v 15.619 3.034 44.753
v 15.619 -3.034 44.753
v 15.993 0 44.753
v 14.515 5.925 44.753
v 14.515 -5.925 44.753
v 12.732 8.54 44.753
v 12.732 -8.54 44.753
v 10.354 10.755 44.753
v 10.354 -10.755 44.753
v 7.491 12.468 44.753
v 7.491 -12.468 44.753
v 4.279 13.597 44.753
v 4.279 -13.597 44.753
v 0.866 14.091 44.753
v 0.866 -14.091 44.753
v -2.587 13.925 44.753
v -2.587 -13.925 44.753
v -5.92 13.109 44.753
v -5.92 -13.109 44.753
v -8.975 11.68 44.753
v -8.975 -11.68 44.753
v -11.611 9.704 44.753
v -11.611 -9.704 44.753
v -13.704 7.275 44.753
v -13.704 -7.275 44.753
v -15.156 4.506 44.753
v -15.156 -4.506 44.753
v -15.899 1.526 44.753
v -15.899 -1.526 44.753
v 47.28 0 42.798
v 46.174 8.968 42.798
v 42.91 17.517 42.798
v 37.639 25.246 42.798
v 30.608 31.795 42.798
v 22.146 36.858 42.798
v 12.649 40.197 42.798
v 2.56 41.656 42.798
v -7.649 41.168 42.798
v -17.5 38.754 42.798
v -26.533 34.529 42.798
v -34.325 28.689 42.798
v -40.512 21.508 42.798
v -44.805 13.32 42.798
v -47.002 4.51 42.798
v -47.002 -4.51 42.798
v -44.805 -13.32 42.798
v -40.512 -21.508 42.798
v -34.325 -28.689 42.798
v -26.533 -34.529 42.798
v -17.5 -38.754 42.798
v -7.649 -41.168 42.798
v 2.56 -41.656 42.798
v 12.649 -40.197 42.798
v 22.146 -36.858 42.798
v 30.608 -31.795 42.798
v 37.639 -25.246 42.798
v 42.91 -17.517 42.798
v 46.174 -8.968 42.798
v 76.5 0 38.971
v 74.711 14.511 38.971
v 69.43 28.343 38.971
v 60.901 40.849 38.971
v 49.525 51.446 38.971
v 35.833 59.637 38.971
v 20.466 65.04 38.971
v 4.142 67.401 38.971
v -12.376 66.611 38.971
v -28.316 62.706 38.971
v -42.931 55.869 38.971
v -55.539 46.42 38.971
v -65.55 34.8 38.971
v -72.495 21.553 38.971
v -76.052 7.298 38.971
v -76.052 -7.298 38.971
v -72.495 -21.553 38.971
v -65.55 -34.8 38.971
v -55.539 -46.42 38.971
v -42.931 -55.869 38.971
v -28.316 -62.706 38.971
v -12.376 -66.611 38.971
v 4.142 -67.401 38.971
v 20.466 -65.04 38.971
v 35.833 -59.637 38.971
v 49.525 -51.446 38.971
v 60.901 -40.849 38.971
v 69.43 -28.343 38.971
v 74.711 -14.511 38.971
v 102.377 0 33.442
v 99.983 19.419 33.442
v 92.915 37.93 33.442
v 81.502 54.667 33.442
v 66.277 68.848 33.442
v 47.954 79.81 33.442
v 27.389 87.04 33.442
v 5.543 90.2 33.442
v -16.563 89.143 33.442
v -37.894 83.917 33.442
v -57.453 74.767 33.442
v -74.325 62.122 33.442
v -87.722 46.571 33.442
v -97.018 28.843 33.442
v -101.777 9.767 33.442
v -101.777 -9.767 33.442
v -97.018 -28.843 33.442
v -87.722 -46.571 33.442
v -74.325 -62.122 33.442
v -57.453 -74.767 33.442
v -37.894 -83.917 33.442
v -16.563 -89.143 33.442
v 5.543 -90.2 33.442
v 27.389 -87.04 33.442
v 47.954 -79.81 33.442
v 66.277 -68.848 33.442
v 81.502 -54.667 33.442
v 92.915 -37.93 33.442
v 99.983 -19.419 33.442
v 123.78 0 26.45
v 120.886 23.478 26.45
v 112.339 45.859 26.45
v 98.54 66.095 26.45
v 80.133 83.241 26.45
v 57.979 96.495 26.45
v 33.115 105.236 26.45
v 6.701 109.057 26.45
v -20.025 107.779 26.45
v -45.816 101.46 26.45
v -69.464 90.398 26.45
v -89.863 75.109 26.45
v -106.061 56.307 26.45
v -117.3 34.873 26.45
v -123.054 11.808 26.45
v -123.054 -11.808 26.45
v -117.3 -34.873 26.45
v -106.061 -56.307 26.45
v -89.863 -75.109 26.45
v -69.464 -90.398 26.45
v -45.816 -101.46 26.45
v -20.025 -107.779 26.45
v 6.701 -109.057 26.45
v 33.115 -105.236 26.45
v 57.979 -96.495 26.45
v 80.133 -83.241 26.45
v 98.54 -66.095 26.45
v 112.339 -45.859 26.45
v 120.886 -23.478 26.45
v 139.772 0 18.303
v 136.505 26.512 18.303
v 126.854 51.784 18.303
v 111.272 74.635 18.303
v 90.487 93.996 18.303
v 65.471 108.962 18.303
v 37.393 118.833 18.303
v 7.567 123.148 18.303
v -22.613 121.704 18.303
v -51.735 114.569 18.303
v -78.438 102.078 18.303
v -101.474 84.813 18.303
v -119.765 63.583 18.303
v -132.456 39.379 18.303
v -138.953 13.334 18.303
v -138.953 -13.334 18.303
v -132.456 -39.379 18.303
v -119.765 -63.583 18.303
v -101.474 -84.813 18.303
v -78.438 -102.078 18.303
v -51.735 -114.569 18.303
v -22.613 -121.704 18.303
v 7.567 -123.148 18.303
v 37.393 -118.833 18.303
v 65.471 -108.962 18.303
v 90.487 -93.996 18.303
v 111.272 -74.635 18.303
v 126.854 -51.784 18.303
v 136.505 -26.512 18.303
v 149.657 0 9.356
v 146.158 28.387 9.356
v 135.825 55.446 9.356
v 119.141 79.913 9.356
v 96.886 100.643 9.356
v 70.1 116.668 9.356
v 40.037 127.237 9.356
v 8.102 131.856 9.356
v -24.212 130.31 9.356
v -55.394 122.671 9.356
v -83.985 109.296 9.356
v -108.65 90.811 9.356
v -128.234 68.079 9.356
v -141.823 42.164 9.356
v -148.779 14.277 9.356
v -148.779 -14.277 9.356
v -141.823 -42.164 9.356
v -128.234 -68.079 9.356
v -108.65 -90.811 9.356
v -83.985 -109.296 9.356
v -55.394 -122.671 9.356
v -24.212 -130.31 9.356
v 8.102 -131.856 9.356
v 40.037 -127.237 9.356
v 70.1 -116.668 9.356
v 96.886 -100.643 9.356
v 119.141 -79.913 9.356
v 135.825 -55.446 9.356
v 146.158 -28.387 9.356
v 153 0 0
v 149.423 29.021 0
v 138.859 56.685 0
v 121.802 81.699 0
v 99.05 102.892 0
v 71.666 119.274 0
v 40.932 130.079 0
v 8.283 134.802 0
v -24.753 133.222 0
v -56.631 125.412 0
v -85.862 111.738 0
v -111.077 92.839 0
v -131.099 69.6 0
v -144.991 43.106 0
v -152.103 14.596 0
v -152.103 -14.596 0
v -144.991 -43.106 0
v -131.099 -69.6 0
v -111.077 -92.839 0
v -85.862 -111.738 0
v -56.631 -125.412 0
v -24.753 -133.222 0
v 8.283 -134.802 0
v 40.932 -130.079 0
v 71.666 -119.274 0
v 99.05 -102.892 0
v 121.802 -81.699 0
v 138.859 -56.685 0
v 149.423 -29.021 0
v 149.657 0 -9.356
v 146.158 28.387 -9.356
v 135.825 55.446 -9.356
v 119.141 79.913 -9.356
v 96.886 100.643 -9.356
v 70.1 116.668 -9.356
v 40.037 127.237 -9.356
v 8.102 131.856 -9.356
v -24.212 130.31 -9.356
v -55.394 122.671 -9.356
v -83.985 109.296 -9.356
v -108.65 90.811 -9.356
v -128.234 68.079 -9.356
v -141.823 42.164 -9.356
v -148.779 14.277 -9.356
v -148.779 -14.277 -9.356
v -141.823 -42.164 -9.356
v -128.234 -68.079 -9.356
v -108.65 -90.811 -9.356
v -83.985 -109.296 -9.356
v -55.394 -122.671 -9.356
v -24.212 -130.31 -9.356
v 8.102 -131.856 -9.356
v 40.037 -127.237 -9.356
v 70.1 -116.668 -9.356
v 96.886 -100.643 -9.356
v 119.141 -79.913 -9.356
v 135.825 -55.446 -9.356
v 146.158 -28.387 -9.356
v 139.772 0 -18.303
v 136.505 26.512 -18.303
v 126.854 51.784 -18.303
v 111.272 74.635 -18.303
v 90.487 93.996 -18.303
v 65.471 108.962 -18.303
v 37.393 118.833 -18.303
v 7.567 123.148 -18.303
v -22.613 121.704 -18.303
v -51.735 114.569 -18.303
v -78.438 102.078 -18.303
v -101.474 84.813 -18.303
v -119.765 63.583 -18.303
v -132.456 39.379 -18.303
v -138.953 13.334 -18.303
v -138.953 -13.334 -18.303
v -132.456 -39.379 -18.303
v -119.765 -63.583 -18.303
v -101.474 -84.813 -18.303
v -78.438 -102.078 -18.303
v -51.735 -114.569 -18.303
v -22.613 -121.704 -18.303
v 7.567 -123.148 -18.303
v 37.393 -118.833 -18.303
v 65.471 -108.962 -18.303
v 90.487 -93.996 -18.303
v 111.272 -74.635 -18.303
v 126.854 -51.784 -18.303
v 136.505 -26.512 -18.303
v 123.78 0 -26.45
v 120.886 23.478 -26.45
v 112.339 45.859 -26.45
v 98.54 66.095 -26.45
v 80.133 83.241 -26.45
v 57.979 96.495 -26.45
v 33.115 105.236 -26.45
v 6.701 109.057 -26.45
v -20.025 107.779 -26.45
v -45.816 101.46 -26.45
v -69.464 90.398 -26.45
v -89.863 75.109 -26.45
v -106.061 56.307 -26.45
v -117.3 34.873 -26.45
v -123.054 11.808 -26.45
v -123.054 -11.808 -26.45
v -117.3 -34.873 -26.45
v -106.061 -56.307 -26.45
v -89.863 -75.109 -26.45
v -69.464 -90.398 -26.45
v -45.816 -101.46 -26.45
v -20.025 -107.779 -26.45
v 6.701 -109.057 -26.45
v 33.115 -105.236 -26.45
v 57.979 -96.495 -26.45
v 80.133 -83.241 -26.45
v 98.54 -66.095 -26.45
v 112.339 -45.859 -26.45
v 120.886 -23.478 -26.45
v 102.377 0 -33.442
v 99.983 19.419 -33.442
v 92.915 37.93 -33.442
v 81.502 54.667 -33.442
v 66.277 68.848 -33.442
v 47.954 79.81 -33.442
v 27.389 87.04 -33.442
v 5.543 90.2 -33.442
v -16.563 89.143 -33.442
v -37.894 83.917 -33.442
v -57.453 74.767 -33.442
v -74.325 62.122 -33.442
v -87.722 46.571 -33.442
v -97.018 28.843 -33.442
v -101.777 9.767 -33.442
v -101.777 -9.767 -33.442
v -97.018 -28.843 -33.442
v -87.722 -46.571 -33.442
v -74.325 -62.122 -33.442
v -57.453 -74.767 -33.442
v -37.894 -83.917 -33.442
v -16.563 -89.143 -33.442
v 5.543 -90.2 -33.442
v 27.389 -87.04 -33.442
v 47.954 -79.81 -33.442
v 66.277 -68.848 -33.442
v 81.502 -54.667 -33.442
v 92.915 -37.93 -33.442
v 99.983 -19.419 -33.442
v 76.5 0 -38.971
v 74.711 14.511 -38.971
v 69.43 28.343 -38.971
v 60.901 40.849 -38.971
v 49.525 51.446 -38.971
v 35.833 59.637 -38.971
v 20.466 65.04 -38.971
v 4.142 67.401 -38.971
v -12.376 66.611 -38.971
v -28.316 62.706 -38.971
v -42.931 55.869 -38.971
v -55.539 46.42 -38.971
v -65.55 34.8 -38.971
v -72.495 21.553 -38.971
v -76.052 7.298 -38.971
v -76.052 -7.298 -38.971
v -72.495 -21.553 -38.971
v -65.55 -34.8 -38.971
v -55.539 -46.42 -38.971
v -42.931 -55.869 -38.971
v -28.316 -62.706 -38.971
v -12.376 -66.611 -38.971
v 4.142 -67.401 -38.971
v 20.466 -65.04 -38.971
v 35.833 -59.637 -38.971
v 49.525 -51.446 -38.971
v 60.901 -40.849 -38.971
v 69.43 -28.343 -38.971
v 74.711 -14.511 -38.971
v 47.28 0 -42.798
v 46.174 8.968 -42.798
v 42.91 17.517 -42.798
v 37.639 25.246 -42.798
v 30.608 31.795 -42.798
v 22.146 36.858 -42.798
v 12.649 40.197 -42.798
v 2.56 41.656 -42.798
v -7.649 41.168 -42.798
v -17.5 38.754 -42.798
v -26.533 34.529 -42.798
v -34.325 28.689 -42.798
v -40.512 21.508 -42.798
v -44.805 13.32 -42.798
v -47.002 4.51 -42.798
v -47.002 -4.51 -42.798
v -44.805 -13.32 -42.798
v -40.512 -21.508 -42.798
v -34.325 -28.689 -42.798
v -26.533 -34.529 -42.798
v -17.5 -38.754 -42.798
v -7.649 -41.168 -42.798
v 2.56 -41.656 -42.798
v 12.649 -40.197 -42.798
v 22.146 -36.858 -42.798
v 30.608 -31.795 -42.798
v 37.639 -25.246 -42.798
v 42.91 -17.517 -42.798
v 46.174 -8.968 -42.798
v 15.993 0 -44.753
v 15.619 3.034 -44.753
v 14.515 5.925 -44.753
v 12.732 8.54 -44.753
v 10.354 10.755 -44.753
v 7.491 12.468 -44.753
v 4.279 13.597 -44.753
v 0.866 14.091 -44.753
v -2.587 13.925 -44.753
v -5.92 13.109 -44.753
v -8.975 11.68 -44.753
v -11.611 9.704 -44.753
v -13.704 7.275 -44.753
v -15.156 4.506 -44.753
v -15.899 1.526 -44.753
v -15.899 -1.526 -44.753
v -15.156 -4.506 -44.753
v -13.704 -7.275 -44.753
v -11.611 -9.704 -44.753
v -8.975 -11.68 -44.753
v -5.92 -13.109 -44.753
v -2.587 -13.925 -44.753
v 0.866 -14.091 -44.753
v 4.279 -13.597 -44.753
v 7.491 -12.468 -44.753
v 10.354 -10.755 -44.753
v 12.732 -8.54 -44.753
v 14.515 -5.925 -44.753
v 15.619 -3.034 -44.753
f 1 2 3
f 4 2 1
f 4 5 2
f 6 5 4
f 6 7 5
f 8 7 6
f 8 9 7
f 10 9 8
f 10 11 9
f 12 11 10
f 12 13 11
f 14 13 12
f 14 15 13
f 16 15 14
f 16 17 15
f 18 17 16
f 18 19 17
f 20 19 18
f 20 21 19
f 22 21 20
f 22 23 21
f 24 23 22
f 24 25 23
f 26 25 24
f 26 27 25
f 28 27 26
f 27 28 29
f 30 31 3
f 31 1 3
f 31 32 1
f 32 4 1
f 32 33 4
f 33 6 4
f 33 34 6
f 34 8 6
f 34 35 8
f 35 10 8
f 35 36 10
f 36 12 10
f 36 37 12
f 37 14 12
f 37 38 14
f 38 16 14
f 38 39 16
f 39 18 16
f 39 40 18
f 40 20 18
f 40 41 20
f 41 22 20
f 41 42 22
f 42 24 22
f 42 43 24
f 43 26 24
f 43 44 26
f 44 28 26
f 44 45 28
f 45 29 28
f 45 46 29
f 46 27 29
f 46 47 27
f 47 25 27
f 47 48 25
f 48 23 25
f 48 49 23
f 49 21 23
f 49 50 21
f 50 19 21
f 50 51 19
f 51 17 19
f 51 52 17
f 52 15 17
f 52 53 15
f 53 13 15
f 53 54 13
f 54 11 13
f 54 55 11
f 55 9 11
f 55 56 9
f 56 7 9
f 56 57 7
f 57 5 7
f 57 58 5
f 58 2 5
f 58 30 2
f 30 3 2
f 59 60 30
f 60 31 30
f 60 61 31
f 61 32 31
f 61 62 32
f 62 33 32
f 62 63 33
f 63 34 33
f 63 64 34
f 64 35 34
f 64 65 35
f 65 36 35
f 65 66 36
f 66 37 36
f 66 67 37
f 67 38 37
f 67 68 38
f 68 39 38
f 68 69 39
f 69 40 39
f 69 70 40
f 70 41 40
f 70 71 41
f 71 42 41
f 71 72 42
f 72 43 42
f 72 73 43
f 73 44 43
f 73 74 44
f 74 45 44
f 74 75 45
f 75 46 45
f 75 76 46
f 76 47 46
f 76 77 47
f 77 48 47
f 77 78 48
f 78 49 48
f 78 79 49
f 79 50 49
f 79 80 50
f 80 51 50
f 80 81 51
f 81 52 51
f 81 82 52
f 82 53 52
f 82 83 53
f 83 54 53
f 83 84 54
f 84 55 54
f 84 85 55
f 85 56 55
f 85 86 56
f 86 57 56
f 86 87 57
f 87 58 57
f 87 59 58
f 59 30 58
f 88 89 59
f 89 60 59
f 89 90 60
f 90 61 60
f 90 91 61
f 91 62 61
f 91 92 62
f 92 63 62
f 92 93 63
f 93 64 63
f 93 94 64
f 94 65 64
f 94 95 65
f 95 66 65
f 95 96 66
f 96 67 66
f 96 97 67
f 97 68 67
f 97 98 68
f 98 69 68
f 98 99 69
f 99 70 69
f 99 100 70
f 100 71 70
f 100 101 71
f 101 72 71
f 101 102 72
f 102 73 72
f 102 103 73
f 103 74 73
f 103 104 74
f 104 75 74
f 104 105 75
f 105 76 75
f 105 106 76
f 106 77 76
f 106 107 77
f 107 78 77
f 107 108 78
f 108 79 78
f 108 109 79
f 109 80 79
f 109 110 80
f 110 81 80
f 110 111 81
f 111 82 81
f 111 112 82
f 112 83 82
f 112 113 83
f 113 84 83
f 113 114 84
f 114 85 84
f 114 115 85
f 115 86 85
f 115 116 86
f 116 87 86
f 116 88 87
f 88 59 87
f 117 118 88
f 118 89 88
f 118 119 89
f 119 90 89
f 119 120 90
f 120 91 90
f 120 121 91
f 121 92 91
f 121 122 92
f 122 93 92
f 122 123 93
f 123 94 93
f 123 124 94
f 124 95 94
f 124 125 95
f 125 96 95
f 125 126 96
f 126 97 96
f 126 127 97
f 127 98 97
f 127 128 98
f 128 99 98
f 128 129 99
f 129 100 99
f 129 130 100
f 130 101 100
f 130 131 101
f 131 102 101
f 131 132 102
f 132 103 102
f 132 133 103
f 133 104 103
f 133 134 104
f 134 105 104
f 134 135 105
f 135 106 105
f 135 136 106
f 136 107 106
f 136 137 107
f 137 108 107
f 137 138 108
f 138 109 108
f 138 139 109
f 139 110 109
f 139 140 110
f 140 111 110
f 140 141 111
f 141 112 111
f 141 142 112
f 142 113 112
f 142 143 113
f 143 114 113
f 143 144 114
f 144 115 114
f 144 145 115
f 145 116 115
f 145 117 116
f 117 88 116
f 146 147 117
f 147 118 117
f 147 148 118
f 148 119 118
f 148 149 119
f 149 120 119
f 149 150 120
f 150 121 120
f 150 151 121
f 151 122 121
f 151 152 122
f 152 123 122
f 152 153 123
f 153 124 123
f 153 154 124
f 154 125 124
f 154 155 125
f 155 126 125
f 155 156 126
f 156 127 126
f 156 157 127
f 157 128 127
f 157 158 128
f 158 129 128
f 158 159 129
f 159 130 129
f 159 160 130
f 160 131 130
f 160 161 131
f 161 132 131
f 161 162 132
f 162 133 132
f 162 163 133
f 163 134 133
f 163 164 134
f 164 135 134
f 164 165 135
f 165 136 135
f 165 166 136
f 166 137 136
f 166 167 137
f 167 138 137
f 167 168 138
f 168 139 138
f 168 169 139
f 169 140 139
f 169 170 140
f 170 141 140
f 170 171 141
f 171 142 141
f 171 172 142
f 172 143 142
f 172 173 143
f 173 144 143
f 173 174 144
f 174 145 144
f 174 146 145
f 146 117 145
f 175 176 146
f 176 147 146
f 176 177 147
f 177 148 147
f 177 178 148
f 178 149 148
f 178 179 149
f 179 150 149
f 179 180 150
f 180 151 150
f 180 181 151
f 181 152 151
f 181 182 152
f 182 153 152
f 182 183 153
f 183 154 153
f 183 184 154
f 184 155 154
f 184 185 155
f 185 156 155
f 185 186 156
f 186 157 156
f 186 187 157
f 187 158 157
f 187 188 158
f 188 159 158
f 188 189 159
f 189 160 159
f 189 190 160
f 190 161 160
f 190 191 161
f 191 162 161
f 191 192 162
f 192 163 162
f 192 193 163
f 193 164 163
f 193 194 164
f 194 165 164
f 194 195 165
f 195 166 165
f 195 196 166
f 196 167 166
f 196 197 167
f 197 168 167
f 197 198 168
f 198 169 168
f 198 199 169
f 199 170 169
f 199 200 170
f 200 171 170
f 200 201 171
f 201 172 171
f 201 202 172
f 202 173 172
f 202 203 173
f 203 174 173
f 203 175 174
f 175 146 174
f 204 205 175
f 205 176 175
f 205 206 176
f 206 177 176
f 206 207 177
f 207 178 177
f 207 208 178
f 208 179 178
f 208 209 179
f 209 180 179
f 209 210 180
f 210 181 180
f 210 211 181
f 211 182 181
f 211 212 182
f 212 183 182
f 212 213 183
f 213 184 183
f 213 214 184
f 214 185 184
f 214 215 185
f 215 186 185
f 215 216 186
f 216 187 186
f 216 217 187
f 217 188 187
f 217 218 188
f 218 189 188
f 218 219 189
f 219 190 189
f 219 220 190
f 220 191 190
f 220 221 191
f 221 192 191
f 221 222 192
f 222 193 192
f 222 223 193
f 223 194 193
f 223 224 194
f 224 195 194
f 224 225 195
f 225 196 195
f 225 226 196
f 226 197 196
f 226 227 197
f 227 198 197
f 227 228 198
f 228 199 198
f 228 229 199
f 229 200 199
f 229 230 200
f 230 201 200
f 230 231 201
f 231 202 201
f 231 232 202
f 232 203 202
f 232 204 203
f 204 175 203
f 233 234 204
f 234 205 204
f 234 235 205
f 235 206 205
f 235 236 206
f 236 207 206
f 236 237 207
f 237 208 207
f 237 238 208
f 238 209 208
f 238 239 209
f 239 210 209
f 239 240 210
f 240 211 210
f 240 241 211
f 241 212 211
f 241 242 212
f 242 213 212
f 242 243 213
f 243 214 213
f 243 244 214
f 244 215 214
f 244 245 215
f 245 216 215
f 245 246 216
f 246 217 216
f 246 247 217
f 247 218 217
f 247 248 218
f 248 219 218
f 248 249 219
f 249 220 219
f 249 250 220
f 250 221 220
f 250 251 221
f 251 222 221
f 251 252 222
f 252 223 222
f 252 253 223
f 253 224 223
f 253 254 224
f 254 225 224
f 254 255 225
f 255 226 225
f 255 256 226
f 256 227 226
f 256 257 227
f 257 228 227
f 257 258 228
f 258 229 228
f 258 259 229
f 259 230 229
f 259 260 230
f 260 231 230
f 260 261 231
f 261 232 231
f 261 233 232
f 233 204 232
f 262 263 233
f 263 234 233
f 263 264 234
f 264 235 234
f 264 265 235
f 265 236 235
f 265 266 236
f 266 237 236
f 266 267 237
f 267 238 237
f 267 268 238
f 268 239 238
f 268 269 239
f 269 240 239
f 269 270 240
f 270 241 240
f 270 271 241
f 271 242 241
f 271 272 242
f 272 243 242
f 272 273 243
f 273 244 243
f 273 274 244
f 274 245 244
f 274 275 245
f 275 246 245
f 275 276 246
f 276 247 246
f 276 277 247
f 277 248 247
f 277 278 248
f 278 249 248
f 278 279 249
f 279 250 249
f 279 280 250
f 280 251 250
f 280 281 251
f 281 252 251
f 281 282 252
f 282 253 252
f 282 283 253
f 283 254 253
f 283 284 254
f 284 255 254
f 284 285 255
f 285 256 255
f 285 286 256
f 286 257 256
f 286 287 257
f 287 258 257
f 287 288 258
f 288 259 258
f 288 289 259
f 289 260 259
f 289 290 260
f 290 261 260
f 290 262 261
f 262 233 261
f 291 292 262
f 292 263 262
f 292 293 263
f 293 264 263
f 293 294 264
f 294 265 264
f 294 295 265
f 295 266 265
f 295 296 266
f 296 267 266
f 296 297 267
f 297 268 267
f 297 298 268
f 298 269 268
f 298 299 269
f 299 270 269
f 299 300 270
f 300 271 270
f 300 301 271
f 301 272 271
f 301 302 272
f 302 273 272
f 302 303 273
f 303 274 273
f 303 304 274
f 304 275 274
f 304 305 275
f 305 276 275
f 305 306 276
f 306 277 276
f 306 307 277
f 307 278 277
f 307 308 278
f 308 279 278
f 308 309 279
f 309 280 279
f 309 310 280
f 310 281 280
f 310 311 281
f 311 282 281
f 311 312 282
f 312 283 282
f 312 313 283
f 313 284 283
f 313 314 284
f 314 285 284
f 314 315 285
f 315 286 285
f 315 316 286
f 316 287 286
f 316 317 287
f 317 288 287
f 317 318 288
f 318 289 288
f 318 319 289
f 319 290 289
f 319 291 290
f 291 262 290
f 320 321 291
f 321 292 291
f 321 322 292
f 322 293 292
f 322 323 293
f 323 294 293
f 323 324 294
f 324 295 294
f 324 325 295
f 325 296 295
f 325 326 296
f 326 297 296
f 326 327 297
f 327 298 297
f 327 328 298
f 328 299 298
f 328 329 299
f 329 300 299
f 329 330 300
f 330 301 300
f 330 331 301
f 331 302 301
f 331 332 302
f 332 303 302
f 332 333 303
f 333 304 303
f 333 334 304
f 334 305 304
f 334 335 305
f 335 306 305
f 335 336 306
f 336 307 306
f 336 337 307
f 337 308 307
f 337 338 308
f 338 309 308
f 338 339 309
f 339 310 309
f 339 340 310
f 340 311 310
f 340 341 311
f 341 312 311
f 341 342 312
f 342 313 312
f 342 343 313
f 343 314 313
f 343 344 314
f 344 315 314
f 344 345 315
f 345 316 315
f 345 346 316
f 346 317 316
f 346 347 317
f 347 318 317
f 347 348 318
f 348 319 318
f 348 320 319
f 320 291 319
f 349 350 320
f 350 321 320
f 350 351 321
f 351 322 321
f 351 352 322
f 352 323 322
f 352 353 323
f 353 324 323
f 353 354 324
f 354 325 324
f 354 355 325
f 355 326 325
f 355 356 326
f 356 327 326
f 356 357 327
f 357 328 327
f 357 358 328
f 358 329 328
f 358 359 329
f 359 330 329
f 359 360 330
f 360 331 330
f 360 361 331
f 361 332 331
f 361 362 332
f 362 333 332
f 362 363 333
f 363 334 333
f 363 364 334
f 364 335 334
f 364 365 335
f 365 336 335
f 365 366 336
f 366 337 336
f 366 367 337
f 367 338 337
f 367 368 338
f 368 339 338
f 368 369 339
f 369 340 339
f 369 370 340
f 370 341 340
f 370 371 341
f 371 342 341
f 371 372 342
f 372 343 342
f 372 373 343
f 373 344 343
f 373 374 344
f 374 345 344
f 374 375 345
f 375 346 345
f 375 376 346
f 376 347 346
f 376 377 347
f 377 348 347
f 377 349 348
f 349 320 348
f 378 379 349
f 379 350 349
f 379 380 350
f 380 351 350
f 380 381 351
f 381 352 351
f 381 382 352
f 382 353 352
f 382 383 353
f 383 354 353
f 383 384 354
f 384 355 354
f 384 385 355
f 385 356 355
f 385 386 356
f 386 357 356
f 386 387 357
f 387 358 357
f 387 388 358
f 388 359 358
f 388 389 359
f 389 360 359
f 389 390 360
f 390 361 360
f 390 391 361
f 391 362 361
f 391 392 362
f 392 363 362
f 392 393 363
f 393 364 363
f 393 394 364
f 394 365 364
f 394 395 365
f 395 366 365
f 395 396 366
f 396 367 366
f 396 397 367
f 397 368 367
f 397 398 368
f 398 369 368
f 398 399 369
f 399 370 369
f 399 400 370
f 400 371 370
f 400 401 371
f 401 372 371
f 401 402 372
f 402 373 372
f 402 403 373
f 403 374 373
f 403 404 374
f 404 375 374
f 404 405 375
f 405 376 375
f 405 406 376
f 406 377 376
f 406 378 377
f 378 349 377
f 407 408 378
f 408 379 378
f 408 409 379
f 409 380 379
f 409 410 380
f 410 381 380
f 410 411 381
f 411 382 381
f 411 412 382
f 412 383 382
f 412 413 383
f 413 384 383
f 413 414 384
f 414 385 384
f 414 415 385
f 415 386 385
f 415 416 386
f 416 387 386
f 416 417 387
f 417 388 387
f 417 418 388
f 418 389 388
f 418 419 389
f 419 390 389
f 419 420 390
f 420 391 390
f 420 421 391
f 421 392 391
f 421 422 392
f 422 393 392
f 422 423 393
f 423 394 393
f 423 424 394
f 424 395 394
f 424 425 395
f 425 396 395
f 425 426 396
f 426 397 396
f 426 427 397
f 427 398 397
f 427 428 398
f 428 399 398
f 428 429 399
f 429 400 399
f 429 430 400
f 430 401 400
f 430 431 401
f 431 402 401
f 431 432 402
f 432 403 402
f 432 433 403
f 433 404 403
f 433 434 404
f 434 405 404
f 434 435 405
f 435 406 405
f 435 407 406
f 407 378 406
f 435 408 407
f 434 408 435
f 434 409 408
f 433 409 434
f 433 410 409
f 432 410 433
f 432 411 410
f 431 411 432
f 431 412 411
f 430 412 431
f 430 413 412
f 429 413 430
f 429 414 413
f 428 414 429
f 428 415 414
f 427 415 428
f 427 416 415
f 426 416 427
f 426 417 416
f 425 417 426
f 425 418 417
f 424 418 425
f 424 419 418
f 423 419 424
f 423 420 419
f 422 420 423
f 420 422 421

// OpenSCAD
// Generated by SolidPython 1.0.1 on 2020-07-29 00:46:53


scale(v = [17, 15, 5]) {
	sphere(r = 9);
}
/***********************************************
*********      SolidPython code:      **********
************************************************
 
# import packages: SolidPython
from solid import *
from solid.utils import *
from itertools import chain, combinations, permutations


class Resize:

    def __init__(self, scad_file):
        self.scad_file = scad_file
        #self.scad_file = import_scad(scad_file)
        # cone/cylinder param:
        self.r1 = 0
        self.r2 = 0
        self.h = 0
        # rectangular prism param:
        self.w = 0
        self.l = 0
        # ellipse param:
        self.r = 0

    # import OpenScad code (file name corresponds to shape)


    # classify shape + parameters
    def assign(self, param1, param2, param3):
        if self.scad_file == 'cone.scad':
            self.r1 = param1
            self.r2 = param2
            self.h = param3
        elif self.scad_file == 'cylinder.scad':
            self.r1 = param1
            self.r2 = param2
            self.h = param3
        elif self.scad_file == 'rectangularPrism.scad':
            self.h = param1
            self.l = param2
            self.w = param3
        else:
            self.r = param1
            self.h = param2

    # resize parameters
    def iterate(self):
        x = range(3, 20, 2)
        i = 1
        if self.scad_file == 'cone.scad':
            tempList = list(permutations(x, 2))
            for temp in tempList:
                param1 = temp[0]
                param2 = temp[1]
                filepath = 'produced_scad_files/' + 'cone' + str(param1) + '_' + str(param2) + '_' + '.scad'
                scad_render_to_file(cylinder(h=param1, r1=param2, r2=0), filepath)

        elif self.scad_file == 'cylinder.scad':
            tempList = list(permutations(x, 3))
            for temp in tempList:
                param1 = temp[0]
                param2 = temp[1]
                filepath = 'produced_scad_files/' + 'cylinder' + str(param1) + '_' + str(param2) + '_' + '.scad'
                scad_render_to_file(cylinder(h=param1, r1=param2, r2=param2), filepath)

        elif self.scad_file == 'rectangularPrism.scad':
            tempList = list(permutations(x, 3))
            for temp in tempList:
                param1 = temp[0]
                param2 = temp[1]
                param3 = temp[2]
                filepath = 'produced_scad_files/' + 'rectangularPrism' + str(param1) + '_' + str(param2) + '_' + str(
                    param3) + '.scad'
                scad_render_to_file(cube(size=(param1, param2, param3)), filepath)

        elif self.scad_file == 'ellipse.scad':
            tempList = list(permutations(x, 4))
            for temp in tempList:
                param1 = temp[0]
                param2 = temp[1]
                param3 = temp[2]
                param4 = temp[3]
                filepath = 'produced_scad_files/' + 'ellipse' + str(param1) + '_' + str(param2) + '_' + str(param3) + '_' + str(param4) + '.scad'
                scad_render_to_file(scale([param1, param2, param3])(sphere(r=param4)), filepath)

    def render_to_scadfile(self):
        scad_render_to_file(scad, 'example.scad') 
 
************************************************/
